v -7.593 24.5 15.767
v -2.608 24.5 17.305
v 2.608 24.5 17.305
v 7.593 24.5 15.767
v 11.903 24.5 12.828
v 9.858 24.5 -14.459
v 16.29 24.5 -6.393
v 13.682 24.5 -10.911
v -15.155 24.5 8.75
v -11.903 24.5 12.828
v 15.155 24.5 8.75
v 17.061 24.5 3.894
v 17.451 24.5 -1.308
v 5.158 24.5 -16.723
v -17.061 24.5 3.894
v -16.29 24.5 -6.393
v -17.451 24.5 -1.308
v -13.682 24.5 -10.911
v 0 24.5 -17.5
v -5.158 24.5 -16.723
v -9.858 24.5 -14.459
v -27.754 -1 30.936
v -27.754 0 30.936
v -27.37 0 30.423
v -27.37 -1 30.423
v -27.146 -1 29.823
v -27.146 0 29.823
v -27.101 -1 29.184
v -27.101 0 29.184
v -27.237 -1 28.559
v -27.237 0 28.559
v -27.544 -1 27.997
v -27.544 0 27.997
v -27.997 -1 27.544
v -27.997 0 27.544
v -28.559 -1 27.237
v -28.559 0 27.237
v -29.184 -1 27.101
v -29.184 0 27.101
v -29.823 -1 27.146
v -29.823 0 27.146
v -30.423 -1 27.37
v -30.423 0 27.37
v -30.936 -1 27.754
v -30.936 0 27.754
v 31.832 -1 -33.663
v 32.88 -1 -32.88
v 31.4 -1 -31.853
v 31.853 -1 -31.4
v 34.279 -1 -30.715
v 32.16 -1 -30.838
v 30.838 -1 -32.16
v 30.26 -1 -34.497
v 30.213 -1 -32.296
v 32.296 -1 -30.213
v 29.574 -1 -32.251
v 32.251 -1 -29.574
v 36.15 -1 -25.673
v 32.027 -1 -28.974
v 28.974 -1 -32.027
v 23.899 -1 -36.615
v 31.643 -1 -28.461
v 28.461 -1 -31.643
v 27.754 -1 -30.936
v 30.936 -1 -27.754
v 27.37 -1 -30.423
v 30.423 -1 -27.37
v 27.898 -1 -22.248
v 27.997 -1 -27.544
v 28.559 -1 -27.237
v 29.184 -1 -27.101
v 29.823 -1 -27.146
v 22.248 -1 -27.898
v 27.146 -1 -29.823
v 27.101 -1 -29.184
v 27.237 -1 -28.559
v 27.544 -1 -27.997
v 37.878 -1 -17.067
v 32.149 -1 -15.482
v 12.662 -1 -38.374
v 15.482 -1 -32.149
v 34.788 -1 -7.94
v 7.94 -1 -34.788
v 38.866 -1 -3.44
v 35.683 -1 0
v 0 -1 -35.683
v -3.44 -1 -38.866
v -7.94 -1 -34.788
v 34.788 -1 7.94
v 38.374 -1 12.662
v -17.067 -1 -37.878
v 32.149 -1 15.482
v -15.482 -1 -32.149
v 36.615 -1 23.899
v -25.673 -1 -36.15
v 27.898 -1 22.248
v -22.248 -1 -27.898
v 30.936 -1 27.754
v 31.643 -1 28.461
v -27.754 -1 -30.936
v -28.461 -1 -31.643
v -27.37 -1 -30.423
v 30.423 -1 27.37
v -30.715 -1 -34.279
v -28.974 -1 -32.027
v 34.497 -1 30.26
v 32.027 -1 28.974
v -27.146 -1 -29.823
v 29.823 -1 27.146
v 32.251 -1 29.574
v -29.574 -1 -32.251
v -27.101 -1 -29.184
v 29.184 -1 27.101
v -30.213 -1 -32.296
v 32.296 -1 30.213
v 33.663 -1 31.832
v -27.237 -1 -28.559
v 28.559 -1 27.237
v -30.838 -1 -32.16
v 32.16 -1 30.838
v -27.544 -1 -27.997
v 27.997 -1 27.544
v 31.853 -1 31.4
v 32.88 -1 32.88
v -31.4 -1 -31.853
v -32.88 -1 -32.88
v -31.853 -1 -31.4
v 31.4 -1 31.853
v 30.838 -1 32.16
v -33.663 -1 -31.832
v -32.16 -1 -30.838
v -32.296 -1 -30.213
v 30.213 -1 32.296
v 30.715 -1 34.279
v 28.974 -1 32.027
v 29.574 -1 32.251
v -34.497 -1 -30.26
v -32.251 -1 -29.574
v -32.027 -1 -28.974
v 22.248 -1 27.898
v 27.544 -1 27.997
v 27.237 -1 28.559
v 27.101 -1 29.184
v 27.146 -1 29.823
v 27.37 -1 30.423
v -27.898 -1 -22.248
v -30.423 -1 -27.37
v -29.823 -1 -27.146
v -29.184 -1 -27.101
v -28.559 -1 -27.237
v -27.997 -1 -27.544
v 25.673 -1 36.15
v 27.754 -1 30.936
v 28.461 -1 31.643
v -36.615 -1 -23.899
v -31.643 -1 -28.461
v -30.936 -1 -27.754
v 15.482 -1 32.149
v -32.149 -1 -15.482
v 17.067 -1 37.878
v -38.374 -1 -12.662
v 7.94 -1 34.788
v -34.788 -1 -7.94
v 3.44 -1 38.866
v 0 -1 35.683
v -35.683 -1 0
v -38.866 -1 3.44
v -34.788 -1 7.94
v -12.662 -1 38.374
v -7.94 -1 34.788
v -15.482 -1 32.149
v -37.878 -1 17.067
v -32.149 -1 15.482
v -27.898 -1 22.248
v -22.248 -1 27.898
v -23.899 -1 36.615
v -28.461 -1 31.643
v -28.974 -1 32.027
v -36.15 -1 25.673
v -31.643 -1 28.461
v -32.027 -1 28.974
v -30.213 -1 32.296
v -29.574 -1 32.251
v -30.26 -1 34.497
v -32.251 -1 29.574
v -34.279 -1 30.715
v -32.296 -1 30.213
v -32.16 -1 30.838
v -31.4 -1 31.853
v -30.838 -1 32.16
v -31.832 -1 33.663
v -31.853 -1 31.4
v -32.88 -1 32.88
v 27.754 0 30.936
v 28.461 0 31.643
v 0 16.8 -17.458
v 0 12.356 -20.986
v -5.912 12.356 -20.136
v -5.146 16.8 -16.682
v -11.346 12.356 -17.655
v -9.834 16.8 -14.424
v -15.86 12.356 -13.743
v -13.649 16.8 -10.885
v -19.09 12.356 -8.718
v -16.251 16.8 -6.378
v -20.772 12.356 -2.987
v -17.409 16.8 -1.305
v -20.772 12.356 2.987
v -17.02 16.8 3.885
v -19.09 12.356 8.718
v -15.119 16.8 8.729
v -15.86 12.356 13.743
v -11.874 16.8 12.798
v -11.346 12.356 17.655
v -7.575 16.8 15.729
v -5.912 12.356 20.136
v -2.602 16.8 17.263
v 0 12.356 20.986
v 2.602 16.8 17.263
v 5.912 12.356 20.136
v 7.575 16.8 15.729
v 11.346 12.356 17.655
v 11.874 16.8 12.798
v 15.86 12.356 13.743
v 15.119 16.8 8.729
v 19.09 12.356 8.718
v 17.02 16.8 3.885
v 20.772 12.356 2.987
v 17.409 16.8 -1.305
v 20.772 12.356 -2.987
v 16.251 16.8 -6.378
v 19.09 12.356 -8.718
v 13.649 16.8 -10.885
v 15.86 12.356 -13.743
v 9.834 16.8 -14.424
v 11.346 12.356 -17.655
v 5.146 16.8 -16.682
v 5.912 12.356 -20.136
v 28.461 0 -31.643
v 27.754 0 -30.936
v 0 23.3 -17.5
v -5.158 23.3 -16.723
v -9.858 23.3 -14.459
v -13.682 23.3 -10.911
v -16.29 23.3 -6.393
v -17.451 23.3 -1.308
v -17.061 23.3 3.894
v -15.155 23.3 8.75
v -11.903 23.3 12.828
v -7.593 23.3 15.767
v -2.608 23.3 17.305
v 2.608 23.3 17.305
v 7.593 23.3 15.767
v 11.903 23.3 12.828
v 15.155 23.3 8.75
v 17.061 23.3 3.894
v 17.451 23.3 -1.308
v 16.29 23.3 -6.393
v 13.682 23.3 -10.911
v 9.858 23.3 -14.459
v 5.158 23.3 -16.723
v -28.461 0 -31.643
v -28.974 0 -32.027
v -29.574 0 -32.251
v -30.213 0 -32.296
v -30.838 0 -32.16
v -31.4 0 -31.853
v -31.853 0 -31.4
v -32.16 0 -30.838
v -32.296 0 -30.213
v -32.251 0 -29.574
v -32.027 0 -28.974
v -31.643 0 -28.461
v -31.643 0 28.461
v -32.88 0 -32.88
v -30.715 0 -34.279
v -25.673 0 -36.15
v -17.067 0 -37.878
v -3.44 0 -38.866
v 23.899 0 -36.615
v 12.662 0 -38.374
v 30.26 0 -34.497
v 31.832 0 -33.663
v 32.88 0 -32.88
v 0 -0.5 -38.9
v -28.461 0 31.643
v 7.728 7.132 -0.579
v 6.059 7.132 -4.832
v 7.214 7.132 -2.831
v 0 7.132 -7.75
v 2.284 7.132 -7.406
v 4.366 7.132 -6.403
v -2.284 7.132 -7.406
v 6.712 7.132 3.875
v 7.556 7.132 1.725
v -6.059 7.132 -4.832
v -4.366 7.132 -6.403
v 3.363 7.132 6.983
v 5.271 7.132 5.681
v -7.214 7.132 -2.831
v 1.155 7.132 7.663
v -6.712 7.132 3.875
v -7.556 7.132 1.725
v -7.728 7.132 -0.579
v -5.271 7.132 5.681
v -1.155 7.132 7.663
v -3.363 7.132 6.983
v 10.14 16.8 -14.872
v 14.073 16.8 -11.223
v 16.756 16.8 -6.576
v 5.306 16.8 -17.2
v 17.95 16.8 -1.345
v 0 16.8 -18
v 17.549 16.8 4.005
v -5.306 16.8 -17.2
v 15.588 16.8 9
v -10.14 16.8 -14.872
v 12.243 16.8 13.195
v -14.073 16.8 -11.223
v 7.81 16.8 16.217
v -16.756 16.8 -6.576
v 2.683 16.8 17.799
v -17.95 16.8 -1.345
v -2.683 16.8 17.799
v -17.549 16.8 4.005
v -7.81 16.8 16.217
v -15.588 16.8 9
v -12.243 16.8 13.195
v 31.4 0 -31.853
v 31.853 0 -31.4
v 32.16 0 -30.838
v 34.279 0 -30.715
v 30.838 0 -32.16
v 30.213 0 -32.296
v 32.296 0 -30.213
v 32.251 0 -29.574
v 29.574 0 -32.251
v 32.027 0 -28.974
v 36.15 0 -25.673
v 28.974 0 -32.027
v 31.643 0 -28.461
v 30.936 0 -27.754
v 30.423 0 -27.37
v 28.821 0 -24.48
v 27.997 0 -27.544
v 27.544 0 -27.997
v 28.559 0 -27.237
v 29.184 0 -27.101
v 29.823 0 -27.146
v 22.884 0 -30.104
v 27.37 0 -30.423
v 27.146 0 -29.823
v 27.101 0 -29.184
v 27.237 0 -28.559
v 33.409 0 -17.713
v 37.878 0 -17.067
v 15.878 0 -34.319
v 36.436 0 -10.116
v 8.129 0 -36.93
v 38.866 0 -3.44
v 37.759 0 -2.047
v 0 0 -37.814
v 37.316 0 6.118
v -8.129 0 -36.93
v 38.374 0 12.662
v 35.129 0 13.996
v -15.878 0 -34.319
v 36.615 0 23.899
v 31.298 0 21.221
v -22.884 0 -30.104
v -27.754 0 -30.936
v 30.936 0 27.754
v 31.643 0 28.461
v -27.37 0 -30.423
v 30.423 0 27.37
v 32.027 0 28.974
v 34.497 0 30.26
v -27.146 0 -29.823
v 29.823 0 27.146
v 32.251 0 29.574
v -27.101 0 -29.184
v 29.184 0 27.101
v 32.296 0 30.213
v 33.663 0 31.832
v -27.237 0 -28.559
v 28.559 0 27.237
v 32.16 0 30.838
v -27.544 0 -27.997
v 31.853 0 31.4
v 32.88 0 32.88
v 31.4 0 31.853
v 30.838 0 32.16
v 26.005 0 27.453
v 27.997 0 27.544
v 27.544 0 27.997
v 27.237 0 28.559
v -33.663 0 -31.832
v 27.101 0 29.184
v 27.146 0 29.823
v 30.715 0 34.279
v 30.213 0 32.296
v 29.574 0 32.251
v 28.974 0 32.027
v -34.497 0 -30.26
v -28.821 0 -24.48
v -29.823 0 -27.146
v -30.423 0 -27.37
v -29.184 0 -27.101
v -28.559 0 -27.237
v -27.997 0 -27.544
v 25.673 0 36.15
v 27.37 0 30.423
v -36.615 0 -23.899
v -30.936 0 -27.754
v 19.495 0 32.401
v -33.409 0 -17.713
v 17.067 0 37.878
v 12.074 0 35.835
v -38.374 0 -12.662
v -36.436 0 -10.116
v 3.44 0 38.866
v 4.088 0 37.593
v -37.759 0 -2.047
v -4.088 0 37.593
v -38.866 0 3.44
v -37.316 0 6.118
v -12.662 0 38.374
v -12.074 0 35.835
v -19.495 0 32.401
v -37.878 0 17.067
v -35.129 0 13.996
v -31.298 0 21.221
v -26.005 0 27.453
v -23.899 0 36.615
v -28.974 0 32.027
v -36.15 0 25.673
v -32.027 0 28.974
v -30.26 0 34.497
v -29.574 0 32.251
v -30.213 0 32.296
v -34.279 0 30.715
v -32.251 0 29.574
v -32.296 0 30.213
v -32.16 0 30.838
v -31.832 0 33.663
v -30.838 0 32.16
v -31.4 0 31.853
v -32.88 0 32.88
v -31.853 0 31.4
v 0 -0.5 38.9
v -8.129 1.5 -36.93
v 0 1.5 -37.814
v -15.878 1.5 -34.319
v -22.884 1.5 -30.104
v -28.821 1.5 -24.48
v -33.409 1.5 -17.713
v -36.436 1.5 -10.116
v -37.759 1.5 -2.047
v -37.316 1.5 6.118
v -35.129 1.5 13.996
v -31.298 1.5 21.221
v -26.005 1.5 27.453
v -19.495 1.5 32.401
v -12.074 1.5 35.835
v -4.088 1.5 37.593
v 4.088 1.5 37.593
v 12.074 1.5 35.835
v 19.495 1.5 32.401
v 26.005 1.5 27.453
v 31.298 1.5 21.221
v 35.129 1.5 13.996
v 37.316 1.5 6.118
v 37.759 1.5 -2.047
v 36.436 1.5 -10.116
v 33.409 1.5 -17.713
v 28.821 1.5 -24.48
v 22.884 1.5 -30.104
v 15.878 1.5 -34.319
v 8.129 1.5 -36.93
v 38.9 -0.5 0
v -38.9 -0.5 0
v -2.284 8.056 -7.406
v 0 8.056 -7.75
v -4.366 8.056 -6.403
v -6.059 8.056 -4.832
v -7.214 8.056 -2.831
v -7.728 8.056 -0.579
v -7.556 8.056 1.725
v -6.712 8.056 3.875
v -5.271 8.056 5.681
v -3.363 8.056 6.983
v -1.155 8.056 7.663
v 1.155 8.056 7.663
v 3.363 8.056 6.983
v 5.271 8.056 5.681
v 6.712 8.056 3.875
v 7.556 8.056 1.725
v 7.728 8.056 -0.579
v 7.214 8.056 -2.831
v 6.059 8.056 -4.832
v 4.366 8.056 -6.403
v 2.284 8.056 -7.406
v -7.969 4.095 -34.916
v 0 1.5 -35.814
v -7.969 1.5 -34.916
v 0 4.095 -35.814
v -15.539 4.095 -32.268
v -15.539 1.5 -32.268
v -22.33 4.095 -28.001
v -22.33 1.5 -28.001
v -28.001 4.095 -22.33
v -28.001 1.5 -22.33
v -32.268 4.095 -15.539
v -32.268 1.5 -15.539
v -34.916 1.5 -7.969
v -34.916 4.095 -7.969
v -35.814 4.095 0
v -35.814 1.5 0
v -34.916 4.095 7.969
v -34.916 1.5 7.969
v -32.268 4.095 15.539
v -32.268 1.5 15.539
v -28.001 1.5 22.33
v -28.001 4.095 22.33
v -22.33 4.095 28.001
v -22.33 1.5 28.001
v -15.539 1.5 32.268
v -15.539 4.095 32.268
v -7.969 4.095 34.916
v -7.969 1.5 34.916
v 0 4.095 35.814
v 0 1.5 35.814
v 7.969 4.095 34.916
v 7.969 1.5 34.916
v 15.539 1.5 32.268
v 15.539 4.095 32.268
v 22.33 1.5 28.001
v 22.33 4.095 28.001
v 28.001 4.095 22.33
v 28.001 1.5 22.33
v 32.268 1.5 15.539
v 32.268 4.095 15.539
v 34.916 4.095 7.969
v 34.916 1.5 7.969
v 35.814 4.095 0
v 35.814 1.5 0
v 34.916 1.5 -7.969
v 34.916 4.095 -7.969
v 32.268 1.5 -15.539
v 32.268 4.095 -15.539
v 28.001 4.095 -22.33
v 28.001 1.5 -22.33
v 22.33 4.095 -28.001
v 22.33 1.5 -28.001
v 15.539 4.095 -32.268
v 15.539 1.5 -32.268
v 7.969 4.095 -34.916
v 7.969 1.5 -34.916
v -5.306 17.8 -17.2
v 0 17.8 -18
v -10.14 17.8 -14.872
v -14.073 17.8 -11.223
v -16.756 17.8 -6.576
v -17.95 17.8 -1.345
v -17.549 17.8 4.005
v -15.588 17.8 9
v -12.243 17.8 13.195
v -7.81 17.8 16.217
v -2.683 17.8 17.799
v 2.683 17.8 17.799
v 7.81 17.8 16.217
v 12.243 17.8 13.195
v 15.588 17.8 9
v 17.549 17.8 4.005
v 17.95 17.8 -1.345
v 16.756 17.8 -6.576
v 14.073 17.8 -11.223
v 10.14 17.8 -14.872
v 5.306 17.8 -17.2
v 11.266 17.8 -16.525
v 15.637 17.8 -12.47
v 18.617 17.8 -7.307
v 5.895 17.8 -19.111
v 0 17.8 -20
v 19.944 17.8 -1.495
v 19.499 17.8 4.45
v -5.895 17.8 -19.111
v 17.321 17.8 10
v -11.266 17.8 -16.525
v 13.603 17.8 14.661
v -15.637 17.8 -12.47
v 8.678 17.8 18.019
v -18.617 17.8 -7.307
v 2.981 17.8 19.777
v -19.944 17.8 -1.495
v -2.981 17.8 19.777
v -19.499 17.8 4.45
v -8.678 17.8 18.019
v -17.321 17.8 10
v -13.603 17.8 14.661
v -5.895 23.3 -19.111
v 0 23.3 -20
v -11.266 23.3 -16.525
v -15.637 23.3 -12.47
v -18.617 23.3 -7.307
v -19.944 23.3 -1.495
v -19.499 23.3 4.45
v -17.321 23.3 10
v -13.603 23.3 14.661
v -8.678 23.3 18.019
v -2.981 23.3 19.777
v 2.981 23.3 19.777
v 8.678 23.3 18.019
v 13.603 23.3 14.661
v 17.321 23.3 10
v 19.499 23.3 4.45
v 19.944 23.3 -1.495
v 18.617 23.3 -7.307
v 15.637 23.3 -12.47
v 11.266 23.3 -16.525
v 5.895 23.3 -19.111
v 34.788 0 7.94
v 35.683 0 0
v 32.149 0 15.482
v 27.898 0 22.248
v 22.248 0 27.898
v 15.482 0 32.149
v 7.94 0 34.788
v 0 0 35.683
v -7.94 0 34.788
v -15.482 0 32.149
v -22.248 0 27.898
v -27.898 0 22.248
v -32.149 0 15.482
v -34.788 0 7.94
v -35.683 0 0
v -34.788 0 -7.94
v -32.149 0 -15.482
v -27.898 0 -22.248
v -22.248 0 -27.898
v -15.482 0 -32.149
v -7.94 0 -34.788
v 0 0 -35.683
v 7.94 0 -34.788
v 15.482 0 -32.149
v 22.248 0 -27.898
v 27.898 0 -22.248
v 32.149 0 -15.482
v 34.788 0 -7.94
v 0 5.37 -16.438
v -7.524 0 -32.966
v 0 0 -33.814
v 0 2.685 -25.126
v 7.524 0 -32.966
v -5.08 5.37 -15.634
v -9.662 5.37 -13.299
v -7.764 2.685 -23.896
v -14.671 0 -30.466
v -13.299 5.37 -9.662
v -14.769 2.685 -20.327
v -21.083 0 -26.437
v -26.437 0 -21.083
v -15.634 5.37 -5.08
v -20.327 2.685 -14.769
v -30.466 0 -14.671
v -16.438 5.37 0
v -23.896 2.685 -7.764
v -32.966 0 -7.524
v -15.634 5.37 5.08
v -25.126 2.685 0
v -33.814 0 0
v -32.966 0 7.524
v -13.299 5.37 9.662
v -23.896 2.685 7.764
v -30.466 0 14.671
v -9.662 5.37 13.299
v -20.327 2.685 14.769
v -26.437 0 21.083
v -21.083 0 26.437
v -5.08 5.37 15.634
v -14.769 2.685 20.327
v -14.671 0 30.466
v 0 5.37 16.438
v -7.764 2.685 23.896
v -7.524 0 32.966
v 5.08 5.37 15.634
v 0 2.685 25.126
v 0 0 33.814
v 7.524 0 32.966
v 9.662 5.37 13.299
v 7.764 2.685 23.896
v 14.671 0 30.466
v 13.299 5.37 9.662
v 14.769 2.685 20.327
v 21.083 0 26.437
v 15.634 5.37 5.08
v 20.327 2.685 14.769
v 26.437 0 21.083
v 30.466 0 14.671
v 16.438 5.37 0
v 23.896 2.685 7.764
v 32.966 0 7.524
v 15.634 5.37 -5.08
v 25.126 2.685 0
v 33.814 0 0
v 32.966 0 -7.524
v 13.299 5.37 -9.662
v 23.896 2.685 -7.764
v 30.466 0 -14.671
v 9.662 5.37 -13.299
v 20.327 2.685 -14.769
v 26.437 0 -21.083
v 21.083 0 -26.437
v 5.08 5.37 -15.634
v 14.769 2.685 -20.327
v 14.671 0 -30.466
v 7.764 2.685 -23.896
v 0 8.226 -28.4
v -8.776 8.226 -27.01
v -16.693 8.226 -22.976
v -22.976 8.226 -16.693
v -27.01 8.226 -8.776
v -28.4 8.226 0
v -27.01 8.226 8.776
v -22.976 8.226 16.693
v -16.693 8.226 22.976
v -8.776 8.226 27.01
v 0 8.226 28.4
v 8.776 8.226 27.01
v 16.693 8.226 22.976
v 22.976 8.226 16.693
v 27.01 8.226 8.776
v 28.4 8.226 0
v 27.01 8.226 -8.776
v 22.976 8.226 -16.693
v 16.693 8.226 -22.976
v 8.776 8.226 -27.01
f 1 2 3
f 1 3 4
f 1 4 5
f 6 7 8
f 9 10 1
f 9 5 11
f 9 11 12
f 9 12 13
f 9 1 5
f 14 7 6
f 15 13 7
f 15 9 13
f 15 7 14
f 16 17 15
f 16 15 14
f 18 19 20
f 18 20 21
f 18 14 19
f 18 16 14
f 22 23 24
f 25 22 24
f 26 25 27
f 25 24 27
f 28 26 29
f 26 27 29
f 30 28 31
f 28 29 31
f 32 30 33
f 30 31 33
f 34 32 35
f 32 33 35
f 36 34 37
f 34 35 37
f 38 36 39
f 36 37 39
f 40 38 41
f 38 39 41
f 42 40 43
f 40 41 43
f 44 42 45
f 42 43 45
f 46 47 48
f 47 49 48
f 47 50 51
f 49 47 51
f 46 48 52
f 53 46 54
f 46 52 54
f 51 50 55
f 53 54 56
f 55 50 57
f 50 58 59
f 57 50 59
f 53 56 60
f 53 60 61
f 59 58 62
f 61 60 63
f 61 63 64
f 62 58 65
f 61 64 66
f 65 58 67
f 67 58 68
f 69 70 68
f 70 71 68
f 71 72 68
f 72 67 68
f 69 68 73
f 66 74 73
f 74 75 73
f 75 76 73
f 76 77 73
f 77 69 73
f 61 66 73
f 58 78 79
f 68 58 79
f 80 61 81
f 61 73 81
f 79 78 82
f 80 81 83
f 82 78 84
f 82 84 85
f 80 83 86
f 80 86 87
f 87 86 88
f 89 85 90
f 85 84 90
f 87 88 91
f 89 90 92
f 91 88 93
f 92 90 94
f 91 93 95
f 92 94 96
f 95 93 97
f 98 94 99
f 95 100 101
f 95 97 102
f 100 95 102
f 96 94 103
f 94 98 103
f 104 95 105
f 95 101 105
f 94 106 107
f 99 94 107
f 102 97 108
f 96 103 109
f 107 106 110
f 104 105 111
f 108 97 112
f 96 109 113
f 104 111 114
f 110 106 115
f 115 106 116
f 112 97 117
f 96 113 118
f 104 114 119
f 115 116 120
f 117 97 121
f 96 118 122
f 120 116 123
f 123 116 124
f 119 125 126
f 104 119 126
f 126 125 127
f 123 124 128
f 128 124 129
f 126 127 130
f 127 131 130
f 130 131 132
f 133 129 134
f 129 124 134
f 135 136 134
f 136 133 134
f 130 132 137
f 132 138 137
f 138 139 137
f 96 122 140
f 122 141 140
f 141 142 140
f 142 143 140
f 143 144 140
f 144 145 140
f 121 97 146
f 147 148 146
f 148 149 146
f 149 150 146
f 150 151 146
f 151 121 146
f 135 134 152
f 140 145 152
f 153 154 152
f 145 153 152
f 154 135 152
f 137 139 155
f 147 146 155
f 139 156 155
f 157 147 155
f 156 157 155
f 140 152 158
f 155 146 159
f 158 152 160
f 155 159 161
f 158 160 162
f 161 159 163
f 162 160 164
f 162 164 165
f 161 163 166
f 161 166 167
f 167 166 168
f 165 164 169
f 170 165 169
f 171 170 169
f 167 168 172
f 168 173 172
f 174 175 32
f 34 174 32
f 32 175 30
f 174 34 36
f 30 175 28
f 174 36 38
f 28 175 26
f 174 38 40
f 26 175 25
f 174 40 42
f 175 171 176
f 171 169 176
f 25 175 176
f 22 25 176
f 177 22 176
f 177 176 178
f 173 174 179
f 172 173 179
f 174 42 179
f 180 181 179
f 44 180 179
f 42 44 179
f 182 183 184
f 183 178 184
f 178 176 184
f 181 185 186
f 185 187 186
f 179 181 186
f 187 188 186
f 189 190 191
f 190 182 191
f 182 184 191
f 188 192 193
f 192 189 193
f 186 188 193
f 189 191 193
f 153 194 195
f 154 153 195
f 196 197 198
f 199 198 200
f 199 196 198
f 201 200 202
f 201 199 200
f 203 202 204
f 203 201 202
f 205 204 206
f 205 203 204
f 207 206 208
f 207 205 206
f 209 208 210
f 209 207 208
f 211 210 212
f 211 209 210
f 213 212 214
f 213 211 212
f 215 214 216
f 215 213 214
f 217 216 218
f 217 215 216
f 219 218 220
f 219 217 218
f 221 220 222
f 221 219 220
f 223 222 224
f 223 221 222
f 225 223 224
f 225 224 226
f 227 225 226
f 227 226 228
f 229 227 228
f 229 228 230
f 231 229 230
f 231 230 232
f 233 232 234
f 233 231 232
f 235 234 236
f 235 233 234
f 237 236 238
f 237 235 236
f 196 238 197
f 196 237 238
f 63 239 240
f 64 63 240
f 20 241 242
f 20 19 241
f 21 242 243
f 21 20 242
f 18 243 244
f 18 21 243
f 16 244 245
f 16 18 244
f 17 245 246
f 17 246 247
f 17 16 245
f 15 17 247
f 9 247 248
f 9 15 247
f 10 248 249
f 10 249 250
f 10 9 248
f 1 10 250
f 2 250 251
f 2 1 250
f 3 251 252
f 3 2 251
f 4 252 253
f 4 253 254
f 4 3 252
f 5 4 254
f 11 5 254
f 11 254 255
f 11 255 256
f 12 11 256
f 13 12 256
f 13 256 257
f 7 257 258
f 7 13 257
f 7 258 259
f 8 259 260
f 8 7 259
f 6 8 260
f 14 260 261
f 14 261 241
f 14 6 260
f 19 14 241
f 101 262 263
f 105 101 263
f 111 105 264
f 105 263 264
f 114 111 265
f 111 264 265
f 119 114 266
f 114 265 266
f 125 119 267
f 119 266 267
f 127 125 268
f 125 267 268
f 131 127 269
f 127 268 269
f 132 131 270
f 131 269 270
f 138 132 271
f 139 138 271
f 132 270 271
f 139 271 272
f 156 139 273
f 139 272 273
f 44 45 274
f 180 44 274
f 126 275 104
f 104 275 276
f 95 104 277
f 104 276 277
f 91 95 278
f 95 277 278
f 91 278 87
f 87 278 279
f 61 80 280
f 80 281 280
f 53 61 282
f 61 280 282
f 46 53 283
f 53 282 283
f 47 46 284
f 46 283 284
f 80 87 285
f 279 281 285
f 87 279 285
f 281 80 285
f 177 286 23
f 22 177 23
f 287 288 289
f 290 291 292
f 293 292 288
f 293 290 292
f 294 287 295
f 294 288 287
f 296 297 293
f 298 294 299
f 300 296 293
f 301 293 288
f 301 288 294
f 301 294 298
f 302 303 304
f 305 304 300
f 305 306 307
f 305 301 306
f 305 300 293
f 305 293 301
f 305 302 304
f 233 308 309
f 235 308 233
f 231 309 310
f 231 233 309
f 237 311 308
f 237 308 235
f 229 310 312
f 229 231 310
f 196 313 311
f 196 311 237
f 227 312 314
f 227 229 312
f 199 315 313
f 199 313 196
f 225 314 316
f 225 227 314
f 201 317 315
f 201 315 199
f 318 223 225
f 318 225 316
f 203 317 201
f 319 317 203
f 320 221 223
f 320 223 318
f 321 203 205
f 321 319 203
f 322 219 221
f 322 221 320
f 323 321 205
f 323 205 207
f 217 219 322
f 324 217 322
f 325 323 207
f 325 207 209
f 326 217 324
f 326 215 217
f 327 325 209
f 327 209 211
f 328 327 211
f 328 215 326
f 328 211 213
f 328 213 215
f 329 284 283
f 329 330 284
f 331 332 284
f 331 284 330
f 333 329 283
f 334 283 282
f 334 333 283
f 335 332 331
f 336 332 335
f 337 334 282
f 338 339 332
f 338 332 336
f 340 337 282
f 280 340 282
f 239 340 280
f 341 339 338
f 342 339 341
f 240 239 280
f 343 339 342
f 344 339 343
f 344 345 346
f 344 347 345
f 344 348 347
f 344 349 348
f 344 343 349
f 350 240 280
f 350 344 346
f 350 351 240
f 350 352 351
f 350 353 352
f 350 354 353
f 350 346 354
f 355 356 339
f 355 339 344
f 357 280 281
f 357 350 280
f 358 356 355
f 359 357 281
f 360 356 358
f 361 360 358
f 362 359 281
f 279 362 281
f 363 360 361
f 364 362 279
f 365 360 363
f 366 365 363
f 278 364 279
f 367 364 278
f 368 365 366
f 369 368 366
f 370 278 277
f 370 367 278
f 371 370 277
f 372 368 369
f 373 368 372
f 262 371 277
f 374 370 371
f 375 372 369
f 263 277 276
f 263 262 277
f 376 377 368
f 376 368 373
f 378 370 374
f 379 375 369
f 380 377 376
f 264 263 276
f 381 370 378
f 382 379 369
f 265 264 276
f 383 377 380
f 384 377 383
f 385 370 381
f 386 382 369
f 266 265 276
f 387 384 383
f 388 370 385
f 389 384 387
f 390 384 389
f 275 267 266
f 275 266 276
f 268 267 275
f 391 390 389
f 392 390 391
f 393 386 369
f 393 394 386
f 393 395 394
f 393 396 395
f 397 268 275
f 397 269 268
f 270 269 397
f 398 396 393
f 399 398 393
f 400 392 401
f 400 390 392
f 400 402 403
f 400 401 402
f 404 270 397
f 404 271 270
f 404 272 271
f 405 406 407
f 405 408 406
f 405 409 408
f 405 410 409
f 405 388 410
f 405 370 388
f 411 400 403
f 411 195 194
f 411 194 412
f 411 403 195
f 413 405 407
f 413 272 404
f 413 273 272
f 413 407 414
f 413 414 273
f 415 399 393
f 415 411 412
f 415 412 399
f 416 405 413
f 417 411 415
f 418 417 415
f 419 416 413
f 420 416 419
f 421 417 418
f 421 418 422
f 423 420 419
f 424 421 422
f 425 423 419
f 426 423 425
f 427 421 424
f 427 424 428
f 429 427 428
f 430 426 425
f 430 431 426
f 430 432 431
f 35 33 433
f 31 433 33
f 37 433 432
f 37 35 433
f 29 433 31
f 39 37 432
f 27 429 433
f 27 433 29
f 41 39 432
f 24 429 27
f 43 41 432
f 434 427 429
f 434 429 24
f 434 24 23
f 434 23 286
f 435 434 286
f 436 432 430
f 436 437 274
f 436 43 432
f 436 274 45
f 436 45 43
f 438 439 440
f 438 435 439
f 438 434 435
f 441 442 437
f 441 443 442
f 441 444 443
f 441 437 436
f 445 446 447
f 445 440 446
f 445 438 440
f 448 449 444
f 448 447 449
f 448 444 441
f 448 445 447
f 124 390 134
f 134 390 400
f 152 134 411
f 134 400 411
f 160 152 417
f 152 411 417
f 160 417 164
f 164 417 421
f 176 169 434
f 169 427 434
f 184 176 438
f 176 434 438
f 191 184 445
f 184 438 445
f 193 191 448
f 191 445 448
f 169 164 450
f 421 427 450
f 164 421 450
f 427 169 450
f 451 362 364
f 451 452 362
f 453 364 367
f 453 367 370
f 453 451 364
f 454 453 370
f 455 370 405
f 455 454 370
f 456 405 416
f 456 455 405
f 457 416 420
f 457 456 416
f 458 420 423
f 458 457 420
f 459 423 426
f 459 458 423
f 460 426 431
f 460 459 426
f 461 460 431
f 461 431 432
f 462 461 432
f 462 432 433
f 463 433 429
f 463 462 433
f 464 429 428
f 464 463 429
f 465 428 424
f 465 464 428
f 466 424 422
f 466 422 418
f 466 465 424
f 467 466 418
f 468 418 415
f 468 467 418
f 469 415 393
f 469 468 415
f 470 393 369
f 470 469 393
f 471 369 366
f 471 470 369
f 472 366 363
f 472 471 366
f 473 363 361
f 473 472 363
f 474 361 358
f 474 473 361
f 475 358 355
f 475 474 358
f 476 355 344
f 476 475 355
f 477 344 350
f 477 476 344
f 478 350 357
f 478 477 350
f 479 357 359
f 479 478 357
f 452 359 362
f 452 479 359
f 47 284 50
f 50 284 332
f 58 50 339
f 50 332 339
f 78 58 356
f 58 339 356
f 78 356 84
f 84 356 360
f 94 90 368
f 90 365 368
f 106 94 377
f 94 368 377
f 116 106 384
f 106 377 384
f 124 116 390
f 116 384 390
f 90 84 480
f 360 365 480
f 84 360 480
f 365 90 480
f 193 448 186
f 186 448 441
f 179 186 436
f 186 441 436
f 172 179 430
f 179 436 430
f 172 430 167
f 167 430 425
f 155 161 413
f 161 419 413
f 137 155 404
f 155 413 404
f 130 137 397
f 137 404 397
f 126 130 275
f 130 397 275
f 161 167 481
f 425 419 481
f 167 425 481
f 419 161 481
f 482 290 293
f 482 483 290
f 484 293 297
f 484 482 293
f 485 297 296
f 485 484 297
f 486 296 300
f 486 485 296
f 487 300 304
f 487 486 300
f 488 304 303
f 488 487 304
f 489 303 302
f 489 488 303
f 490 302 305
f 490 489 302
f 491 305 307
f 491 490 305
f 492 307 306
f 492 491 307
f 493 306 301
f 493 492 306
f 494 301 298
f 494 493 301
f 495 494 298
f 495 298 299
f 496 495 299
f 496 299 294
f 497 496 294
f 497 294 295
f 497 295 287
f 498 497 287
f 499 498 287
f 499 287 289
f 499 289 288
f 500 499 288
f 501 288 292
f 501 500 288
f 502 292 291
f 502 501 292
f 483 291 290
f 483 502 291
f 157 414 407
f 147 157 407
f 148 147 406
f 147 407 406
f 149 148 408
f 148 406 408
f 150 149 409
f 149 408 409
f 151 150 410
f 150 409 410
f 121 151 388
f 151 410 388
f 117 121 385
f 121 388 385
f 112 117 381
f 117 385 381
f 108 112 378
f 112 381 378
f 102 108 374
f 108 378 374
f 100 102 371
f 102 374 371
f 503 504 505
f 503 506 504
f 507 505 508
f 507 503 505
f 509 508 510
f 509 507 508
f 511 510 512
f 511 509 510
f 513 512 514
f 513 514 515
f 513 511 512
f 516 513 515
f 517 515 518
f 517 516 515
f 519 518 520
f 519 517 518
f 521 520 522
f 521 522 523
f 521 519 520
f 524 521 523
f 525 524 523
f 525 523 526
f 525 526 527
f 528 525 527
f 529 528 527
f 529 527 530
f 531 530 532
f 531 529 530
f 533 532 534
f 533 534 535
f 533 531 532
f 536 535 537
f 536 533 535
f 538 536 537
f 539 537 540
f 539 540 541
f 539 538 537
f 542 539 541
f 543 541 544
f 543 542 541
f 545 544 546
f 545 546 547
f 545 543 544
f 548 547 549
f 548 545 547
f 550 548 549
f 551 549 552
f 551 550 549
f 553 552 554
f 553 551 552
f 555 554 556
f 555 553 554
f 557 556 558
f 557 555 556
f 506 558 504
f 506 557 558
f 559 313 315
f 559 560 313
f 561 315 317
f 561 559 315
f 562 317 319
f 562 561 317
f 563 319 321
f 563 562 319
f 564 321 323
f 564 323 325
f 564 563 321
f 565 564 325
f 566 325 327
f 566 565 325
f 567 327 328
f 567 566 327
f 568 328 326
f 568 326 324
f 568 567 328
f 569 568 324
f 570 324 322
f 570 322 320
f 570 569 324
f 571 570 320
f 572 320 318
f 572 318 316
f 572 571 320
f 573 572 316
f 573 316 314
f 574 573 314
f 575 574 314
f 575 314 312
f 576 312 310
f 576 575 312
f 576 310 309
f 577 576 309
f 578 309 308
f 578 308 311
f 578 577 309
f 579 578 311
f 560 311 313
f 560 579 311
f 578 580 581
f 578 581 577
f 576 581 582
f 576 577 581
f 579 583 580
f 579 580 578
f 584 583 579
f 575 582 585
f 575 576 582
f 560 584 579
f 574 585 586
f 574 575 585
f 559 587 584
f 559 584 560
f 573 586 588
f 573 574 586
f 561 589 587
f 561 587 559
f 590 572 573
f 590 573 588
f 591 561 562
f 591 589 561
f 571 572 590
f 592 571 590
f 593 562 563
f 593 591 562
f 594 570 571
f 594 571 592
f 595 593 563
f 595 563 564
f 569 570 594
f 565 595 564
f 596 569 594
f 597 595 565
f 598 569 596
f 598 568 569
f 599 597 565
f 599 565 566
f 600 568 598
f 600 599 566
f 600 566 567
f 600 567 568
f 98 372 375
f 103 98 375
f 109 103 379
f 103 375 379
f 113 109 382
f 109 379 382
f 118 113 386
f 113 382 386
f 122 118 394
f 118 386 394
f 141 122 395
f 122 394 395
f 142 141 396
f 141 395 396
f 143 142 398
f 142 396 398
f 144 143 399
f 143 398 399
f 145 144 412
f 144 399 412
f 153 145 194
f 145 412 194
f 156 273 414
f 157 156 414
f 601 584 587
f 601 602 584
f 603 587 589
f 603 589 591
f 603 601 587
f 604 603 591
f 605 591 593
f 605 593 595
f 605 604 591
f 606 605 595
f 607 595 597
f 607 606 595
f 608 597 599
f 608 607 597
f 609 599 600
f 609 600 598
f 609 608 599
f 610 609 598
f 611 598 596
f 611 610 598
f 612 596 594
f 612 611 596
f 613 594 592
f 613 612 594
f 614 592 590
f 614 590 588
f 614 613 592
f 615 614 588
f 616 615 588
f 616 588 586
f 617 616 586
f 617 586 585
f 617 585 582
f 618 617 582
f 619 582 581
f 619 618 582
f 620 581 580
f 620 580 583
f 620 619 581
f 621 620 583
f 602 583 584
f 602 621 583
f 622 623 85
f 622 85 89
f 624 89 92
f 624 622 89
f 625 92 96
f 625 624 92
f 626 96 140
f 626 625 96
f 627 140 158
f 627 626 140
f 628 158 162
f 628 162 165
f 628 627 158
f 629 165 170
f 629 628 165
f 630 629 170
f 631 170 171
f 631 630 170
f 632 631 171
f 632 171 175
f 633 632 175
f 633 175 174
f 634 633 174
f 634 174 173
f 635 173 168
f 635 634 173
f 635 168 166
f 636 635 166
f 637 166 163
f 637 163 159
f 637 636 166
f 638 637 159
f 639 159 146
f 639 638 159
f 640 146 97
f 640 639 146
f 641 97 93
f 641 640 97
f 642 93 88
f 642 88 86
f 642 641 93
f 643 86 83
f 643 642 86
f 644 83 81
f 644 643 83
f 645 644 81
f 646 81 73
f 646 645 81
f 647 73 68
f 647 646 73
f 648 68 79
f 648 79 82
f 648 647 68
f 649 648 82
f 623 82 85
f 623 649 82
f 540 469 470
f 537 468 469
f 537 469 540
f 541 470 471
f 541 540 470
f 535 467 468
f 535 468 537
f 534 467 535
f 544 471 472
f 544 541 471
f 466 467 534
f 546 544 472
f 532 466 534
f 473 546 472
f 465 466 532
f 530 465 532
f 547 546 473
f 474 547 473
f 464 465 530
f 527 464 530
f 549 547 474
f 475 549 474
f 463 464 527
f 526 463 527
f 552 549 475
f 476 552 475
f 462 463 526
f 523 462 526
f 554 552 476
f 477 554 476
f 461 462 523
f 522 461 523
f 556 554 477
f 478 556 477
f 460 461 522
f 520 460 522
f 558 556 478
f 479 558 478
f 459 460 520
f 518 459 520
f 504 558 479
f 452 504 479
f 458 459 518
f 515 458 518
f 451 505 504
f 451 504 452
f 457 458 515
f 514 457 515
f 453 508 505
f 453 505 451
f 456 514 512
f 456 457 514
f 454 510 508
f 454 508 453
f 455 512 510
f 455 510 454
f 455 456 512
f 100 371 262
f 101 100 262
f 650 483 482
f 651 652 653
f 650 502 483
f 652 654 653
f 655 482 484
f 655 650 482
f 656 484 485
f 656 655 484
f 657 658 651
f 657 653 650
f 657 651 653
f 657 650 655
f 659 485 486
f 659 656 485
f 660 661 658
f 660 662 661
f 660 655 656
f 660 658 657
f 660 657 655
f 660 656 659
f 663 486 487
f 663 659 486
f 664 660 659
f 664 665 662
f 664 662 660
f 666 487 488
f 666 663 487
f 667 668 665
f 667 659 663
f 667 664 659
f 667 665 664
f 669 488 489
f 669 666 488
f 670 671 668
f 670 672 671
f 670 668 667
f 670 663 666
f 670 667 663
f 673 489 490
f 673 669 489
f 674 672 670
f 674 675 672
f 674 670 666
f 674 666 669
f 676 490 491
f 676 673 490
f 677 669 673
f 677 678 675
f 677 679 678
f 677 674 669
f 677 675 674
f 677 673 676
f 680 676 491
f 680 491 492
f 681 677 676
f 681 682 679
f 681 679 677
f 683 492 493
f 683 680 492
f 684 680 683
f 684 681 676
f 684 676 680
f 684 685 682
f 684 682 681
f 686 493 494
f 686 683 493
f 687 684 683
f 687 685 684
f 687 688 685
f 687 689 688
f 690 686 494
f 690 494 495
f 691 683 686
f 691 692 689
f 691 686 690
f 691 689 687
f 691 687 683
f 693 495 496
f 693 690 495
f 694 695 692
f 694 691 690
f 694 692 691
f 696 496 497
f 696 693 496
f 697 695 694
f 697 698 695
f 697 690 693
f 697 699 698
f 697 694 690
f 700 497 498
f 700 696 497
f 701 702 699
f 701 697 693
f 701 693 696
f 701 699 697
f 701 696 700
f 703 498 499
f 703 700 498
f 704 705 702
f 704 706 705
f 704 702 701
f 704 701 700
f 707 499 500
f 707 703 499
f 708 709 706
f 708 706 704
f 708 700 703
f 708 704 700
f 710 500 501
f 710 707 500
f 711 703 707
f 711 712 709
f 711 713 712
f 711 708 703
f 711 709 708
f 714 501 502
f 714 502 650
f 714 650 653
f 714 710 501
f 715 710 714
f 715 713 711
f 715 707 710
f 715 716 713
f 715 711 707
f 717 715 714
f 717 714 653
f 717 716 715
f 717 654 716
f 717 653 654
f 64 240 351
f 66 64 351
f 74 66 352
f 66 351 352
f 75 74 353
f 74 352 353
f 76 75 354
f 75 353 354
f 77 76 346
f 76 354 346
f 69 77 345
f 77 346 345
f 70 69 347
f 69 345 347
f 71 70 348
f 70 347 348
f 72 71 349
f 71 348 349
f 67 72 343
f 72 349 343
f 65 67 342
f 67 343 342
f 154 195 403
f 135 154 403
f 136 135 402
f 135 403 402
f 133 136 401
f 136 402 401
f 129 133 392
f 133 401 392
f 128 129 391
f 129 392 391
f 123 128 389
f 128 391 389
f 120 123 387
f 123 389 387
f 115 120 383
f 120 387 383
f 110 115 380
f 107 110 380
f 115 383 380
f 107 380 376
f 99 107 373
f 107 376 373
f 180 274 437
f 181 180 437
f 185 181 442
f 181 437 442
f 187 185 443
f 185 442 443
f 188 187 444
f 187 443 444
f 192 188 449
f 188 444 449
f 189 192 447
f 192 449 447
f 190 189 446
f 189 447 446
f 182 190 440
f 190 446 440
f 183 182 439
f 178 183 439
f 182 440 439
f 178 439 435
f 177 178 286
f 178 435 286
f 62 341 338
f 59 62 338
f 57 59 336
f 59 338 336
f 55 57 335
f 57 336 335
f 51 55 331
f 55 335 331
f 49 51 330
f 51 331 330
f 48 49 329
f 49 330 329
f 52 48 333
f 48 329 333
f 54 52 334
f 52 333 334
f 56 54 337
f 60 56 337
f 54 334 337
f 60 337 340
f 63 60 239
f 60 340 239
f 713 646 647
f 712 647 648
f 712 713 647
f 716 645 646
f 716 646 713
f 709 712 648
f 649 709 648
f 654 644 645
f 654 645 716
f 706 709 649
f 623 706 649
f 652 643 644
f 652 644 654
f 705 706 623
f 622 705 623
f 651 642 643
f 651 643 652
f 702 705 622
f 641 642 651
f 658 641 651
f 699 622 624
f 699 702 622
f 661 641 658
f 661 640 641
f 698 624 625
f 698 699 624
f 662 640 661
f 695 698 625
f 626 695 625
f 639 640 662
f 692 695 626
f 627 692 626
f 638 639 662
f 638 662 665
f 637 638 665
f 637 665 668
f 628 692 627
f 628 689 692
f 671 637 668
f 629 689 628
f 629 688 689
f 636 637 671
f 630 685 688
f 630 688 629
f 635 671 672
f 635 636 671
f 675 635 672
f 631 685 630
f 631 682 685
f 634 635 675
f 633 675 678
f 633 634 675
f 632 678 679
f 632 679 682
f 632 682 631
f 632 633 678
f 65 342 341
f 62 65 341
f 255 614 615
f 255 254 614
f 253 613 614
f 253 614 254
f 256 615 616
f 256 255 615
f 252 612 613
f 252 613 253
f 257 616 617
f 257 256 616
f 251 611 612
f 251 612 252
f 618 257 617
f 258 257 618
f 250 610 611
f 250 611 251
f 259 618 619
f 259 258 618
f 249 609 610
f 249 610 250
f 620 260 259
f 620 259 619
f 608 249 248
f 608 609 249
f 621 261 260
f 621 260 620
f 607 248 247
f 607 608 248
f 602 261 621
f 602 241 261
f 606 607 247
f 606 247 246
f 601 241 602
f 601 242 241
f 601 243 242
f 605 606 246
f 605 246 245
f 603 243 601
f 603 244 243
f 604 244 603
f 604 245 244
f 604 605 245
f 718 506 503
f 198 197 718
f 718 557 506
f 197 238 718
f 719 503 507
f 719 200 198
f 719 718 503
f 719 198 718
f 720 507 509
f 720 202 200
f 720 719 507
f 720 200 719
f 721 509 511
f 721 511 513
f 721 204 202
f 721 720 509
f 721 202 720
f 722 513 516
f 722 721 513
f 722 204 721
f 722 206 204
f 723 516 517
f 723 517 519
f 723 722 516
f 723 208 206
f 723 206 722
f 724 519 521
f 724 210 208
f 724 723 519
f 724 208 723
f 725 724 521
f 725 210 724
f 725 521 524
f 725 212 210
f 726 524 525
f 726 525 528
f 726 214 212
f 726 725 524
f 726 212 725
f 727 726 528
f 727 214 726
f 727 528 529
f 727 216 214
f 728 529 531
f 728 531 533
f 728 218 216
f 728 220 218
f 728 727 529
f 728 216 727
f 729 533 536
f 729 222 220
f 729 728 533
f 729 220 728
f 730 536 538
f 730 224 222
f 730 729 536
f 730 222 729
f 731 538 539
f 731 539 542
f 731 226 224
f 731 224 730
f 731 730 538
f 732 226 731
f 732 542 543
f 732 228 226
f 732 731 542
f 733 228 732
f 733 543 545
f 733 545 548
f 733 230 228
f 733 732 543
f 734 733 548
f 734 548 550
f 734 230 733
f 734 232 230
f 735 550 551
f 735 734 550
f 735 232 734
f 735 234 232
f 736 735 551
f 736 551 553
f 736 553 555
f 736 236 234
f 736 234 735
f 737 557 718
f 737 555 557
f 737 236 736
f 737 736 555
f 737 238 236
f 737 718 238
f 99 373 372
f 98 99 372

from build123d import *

# Parameters (mm, degrees)
F1_R     = 35.682679
F2_DEPTH = 1


with BuildPart() as f2:
    # F1 (on Front) → F2 (new body)
    with BuildSketch(Plane.XZ):
        with BuildLine():
            add(Edge.make_bspline(
                [(32.880465, 32.880465), (34.240388, 31.520543), (38.9, 23.525566), (38.9, 0)],
                knots=[0, 0, 0, 0, 33.426932, 33.426932, 33.426932, 33.426932], degree=3))
            add(Edge.make_bspline(
                [(32.880465, 32.880465), (31.520543, 34.240388), (23.525566, 38.9), (0, 38.9)],
                knots=[0, 0, 0, 0, 33.426932, 33.426932, 33.426932, 33.426932], degree=3))
            add(Edge.make_bspline(
                [(-32.880465, 32.880465), (-31.520543, 34.240388), (-23.525566, 38.9), (0, 38.9)],
                knots=[0, 0, 0, 0, 33.426932, 33.426932, 33.426932, 33.426932], degree=3))
            add(Edge.make_bspline(
                [(-32.880465, 32.880465), (-34.240388, 31.520543), (-38.9, 23.525566), (-38.9, 0)],
                knots=[0, 0, 0, 0, 33.426932, 33.426932, 33.426932, 33.426932], degree=3))
            add(Edge.make_bspline(
                [(-32.880465, -32.880465), (-34.240388, -31.520543), (-38.9, -23.525566), (-38.9, 0)],
                knots=[0, 0, 0, 0, 33.426932, 33.426932, 33.426932, 33.426932], degree=3))
            add(Edge.make_bspline(
                [(-32.880465, -32.880465), (-31.520543, -34.240388), (-23.525566, -38.9), (0, -38.9)],
                knots=[0, 0, 0, 0, 33.426932, 33.426932, 33.426932, 33.426932], degree=3))
            add(Edge.make_bspline(
                [(32.880465, -32.880465), (31.520543, -34.240388), (23.525566, -38.9), (0, -38.9)],
                knots=[0, 0, 0, 0, 33.426932, 33.426932, 33.426932, 33.426932], degree=3))
            add(Edge.make_bspline(
                [(32.880465, -32.880465), (34.240388, -31.520543), (38.9, -23.525566), (38.9, 0)],
                knots=[0, 0, 0, 0, 33.426932, 33.426932, 33.426932, 33.426932], degree=3))
        make_face()
        with BuildLine():
            ThreePointArc((-28.461048, -31.643028), (-31.643028, -31.643028), (-31.643028, -28.461048))
            Line((-31.643028, -28.461048), (-30.935922, -27.753941))
            ThreePointArc((-30.935922, -27.753941), (-27.753941, -27.753941), (-27.753941, -30.935922))
            Line((-27.753941, -30.935922), (-28.461048, -31.643028))
        make_face(mode=Mode.SUBTRACT)
        with BuildLine():
            ThreePointArc((27.753941, -30.935922), (27.753941, -27.753941), (30.935922, -27.753941))
            Line((30.935922, -27.753941), (31.643028, -28.461048))
            ThreePointArc((31.643028, -28.461048), (31.643028, -31.643028), (28.461048, -31.643028))
            Line((28.461048, -31.643028), (27.753941, -30.935922))
        make_face(mode=Mode.SUBTRACT)
        with BuildLine():
            ThreePointArc((-31.643028, 28.461048), (-31.643028, 31.643028), (-28.461048, 31.643028))
            Line((-28.461048, 31.643028), (-27.753941, 30.935922))
            ThreePointArc((-27.753941, 30.935922), (-27.753941, 27.753941), (-30.935922, 27.753941))
            Line((-30.935922, 27.753941), (-31.643028, 28.461048))
        make_face(mode=Mode.SUBTRACT)
        Circle(F1_R, mode=Mode.SUBTRACT)
        with BuildLine():
            Line((27.753941, 30.935922), (28.461048, 31.643028))
            ThreePointArc((28.461048, 31.643028), (31.643028, 31.643028), (31.643028, 28.461048))
            Line((31.643028, 28.461048), (30.935922, 27.753941))
            ThreePointArc((30.935922, 27.753941), (27.753941, 27.753941), (27.753941, 30.935922))
        make_face(mode=Mode.SUBTRACT)
    extrude(amount=F2_DEPTH)

    # F3 (on Right) → F4 (revolve)
    with BuildSketch(Plane.YZ):
        Polygon((1.5, -35.814233), (4.094791, -35.814233), (12.356458, -20.986004), (16.8, -17.457943), (16.8, -18), (17.8, -18), (17.8, -20), (23.3, -20), (23.3, -17.5), (24.5, -17.5), (24.5, 0), (7.131862, 0), (7.131862, -7.75), (8.055676, -7.75), (0, -33.814233), (0, -37.814233), (1.5, -37.814233), align=None)
    revolve(axis=Axis((0, 18.051954, 0), (0, 1, 0)))


solid = f2.part
